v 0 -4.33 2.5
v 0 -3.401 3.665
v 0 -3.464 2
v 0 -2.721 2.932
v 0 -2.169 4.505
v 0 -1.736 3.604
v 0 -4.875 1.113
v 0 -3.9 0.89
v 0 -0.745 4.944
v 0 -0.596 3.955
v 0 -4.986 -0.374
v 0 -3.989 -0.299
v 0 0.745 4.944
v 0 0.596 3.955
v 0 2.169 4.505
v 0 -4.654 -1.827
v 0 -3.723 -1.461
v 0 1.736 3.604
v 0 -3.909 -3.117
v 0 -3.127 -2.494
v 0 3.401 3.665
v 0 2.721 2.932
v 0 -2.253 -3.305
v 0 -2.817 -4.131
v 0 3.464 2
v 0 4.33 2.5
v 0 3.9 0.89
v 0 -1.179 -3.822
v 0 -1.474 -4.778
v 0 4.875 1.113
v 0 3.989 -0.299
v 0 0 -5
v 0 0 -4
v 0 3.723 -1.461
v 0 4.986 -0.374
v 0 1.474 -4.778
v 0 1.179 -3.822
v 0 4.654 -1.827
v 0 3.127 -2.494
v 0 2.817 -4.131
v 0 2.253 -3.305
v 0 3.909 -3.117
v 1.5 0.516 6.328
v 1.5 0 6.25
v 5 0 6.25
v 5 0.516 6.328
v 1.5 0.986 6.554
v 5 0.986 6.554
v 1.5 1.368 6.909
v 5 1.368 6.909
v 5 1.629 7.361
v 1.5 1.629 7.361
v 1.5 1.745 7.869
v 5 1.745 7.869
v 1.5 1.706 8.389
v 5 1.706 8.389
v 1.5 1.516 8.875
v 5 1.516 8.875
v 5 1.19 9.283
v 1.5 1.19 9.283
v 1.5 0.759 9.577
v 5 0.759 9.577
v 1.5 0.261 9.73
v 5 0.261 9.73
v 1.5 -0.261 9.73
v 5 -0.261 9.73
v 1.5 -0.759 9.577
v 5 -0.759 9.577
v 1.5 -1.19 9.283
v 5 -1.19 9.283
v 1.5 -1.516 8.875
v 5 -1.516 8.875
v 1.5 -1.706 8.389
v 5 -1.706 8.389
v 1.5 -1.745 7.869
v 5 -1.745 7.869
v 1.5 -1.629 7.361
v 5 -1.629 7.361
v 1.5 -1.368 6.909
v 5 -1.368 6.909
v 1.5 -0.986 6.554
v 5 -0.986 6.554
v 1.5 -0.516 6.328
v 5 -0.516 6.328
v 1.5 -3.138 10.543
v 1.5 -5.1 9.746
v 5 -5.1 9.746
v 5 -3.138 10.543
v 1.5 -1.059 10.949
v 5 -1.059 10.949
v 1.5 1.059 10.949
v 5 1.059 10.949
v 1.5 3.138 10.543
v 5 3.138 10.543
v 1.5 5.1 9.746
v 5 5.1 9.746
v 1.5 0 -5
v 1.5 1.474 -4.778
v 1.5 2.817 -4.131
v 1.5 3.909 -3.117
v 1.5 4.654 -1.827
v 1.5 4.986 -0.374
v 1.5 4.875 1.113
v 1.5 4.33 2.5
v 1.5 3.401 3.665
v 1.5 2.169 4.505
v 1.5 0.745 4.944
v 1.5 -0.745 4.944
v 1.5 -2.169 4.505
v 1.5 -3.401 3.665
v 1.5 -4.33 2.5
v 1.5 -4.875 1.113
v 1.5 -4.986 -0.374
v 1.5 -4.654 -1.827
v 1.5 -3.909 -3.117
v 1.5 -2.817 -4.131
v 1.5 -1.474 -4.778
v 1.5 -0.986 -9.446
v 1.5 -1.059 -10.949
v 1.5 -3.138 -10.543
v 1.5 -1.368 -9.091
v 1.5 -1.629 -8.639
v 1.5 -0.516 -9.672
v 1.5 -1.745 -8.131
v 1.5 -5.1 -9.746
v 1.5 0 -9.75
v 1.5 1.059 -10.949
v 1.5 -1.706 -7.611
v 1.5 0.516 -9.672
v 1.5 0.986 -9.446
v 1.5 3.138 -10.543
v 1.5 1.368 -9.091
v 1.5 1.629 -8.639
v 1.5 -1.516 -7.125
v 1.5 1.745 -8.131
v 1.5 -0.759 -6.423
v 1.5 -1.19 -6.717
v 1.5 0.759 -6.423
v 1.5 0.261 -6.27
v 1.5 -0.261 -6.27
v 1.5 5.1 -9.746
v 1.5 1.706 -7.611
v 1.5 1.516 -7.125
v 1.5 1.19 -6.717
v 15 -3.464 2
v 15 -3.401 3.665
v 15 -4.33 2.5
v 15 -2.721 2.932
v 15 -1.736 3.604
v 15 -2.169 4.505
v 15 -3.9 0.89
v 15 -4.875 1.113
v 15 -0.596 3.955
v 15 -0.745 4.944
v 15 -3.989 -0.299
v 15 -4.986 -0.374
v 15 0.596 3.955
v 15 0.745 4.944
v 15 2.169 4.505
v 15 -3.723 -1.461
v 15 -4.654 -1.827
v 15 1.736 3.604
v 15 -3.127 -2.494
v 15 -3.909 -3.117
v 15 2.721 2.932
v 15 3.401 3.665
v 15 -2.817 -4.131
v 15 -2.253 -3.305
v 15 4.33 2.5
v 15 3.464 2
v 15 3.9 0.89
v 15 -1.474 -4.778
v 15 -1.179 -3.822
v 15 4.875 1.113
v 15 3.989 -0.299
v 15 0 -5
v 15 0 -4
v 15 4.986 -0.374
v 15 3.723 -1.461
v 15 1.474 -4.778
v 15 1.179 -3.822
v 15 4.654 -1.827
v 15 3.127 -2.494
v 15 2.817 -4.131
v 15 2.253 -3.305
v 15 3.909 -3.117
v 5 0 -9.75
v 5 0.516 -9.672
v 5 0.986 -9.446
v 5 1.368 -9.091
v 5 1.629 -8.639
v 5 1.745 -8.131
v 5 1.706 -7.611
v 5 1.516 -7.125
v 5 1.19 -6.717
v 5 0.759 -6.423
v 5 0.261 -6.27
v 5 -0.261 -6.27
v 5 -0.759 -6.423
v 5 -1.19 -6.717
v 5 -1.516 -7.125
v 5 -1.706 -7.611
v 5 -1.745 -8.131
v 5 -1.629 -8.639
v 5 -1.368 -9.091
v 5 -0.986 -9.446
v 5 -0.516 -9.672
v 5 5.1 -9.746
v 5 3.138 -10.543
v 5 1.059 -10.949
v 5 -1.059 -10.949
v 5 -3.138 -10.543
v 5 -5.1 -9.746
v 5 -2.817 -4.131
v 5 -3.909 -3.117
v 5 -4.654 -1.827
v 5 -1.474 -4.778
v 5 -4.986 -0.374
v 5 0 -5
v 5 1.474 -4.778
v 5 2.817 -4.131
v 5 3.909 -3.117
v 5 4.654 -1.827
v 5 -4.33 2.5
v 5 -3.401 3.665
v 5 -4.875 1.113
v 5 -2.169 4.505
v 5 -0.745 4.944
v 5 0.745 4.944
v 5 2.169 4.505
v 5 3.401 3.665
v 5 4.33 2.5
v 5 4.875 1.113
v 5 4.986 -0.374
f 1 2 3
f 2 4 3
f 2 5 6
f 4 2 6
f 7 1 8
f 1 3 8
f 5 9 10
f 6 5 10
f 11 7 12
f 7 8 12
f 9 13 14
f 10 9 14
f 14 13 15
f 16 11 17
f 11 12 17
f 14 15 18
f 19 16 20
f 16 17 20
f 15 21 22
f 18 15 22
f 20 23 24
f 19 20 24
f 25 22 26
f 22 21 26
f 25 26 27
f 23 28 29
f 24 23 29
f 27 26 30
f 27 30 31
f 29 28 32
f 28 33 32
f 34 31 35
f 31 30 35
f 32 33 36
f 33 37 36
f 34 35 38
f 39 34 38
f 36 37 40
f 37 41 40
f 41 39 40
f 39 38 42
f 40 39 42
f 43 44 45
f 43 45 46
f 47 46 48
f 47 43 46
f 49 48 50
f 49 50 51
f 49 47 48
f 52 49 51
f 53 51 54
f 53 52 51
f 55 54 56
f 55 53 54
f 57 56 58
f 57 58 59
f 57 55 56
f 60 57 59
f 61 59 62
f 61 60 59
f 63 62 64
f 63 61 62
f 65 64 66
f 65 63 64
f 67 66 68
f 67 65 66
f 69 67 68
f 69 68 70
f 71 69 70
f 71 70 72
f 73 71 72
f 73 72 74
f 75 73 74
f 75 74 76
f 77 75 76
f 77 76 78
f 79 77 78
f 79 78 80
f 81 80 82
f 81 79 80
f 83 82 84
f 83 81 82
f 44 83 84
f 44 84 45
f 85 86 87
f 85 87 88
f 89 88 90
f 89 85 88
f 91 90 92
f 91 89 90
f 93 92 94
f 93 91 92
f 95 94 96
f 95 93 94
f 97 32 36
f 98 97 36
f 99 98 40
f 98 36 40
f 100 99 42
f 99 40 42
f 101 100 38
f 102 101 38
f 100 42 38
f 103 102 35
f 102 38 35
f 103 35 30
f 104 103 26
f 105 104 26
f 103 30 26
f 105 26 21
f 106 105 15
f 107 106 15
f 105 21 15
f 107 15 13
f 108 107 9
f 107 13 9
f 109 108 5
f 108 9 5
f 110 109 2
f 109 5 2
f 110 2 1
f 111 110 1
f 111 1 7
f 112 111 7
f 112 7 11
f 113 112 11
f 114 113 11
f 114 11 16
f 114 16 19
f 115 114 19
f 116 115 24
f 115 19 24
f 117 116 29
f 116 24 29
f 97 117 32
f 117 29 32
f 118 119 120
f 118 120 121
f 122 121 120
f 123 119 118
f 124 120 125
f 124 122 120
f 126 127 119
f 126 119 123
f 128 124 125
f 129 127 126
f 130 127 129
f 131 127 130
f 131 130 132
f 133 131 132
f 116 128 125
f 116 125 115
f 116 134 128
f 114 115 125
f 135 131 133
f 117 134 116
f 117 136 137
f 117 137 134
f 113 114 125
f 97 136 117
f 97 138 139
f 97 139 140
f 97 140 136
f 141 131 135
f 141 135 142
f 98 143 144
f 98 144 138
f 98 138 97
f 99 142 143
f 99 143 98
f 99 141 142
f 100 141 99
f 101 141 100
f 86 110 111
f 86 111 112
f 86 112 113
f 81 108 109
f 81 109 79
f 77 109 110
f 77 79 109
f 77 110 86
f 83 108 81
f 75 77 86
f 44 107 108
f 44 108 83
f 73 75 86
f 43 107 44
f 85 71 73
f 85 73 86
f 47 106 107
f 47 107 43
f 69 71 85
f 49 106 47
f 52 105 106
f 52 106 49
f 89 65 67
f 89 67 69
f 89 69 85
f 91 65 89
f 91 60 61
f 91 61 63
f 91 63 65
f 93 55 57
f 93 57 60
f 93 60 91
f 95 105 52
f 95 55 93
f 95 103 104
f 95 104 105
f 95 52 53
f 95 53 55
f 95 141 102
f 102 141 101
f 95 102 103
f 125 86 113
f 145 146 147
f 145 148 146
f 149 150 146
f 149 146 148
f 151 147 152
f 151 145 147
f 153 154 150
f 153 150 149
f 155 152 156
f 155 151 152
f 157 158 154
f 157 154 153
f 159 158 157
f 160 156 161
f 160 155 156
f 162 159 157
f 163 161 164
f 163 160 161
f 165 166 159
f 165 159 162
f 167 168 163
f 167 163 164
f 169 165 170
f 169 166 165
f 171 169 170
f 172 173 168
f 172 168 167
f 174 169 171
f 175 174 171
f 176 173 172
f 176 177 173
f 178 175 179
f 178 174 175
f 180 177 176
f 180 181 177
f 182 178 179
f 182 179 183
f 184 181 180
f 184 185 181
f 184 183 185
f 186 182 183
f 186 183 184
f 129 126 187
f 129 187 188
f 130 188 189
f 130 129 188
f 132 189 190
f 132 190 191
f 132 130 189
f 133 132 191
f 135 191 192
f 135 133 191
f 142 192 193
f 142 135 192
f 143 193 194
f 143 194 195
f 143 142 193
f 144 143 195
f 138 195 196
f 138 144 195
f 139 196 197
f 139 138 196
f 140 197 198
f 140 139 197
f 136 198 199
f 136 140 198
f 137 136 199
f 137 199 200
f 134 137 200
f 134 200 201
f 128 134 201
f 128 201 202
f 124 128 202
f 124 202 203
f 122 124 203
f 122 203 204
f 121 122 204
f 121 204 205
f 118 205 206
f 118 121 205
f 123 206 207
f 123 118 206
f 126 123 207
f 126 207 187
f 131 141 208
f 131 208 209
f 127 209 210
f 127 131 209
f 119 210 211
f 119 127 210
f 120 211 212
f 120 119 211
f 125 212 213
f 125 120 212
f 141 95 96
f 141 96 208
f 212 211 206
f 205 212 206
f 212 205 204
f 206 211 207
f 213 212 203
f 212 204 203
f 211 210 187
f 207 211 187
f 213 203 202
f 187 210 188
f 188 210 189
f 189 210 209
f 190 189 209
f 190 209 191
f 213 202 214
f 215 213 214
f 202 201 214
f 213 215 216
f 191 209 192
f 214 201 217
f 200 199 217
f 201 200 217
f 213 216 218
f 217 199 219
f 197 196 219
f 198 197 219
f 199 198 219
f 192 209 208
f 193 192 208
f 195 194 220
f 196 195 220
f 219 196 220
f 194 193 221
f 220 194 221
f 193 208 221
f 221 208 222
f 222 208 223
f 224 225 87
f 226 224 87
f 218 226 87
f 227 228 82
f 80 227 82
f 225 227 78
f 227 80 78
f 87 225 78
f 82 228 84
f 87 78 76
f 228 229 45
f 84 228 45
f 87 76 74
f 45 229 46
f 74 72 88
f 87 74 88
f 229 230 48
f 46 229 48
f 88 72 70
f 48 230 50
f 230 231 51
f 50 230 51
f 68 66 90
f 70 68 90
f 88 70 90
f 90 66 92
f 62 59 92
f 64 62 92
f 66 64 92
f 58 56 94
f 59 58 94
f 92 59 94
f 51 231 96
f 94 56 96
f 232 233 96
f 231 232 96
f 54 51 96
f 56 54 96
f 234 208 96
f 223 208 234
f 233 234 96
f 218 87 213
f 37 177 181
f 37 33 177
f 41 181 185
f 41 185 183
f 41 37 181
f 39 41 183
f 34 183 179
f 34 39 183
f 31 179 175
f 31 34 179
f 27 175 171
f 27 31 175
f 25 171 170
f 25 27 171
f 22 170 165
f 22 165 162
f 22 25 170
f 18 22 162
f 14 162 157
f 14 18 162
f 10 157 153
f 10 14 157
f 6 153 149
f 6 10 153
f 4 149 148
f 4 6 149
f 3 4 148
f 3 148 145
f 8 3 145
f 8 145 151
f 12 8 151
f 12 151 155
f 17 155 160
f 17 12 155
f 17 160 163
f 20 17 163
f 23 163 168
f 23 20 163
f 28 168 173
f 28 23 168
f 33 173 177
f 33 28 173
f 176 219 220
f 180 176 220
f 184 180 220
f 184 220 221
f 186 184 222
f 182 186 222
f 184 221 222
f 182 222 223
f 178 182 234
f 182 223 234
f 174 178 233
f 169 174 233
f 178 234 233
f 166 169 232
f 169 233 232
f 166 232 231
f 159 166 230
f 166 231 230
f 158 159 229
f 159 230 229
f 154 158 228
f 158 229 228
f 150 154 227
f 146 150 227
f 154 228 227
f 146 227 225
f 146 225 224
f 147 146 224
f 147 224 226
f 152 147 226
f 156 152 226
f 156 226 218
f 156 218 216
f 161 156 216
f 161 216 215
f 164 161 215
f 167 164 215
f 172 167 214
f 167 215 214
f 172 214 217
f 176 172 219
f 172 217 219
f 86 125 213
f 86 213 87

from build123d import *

# Parameters (mm, degrees)
SKETCH_1_R      = 5
SKETCH_1_R_2    = 4
EXTRUDE_1_DEPTH = 1.5
SKETCH_2_R      = 4
SKETCH_2_R_2    = 1.75
EXTRUDE_2_DEPTH = 3.5
SKETCH_3_R      = 5
SKETCH_3_R_2    = 4
EXTRUDE_3_DEPTH = 10


with BuildPart() as part:
    # 草图1 → 凸台-拉伸1 (new body)
    with BuildSketch(Plane(origin=(0, 0, 0), x_dir=(0, 0, -1), z_dir=(1, 0, 0))):
        Circle(SKETCH_1_R)
        Circle(SKETCH_1_R_2, mode=Mode.SUBTRACT)
    extrude(amount=EXTRUDE_1_DEPTH)

    # 草图2 → 凸台-拉伸2 (add)
    with BuildSketch(Plane(origin=(1.5, 0, 0), x_dir=(0, 0, -1), z_dir=(1, 0, 0))):
        with BuildLine():
            Line((-9.746281342, 5.1), (9.746281342, 5.1))
            ThreePointArc((9.746281342, 5.1), (11, 0), (9.746281342, -5.1))
            Line((9.746281342, -5.1), (-9.746281342, -5.1))
            ThreePointArc((-9.746281342, -5.1), (-11, 0), (-9.746281342, 5.1))
        make_face()
        Circle(SKETCH_2_R, mode=Mode.SUBTRACT)
        with Locations((-8, 0)):
            Circle(SKETCH_2_R_2, mode=Mode.SUBTRACT)
        with Locations((8, 0)):
            Circle(SKETCH_2_R_2, mode=Mode.SUBTRACT)
    extrude(amount=EXTRUDE_2_DEPTH)

    # 草图3 → 凸台-拉伸3 (add)
    with BuildSketch(Plane(origin=(5, 0, 0), x_dir=(0, 0, -1), z_dir=(1, 0, 0))):
        Circle(SKETCH_3_R)
        Circle(SKETCH_3_R_2, mode=Mode.SUBTRACT)
    extrude(amount=EXTRUDE_3_DEPTH)


solid = part.part
